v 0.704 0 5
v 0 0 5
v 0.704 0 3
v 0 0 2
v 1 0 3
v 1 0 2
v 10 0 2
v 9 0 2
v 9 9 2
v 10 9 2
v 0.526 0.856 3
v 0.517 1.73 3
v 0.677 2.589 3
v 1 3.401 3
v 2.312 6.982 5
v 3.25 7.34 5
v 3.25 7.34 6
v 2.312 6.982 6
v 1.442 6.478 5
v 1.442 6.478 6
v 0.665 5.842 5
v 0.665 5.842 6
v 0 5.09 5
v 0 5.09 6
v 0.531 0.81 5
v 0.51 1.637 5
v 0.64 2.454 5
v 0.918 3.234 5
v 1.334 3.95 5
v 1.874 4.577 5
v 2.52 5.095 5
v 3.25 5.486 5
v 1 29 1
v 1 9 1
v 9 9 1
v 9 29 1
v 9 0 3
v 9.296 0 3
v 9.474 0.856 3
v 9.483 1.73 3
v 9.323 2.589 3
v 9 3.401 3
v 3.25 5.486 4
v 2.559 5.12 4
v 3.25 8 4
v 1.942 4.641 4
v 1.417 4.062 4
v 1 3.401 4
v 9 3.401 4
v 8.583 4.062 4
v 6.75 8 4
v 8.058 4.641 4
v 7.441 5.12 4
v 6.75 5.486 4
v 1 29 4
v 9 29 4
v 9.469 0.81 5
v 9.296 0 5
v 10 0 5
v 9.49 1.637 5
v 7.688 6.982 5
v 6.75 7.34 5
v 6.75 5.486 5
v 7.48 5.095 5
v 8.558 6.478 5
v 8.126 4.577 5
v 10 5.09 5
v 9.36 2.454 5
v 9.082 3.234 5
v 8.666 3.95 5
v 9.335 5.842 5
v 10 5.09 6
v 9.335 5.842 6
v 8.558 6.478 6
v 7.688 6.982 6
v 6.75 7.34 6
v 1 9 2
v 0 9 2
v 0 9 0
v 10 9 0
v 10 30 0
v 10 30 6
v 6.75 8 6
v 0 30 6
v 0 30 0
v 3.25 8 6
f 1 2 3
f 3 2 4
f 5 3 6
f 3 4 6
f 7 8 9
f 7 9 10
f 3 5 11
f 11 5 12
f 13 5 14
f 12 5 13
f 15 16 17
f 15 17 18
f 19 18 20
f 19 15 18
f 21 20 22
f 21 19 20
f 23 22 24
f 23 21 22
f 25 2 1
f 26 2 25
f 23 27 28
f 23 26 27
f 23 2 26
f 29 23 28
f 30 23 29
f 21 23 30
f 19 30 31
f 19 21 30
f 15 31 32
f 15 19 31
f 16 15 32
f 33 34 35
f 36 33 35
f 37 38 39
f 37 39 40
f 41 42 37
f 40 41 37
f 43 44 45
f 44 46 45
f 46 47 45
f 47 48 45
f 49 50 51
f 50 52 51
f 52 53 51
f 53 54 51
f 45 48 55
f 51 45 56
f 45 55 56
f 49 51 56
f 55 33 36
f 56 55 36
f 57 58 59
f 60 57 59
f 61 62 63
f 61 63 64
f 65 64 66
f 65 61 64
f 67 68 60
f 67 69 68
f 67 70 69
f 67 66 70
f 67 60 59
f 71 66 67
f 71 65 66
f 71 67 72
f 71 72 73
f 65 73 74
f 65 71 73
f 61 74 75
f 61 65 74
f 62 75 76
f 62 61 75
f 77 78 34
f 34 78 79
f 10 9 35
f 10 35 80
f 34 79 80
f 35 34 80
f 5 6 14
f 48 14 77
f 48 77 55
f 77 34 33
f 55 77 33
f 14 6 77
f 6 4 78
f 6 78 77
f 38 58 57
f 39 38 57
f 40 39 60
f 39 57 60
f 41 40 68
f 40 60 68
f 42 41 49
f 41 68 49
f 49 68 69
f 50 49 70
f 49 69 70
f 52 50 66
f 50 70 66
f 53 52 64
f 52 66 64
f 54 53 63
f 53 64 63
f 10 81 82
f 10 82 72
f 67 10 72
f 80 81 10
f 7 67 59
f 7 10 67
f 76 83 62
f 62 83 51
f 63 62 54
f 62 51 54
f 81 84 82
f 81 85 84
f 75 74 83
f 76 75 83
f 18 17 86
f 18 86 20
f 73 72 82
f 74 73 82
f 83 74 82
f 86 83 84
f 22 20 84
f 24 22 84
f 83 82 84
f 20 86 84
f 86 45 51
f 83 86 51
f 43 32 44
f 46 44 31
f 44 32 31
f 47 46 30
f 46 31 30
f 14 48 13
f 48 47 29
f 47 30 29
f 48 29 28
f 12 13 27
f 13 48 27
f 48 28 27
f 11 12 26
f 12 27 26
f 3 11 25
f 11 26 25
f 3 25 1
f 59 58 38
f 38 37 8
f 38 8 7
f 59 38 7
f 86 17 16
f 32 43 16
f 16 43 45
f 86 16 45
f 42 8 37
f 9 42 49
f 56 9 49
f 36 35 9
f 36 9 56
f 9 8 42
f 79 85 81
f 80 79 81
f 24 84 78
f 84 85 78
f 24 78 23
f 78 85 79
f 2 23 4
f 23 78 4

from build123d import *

# Parameters (mm, degrees)
SKETCH_W        = 10
SKETCH_H        = 30
PAD_DEPTH       = 5
THICKNESS_T     = -1
POCKET_DEPTH    = 2
SKETCH002_W     = 10
SKETCH002_H     = 9
POCKET001_DEPTH = 2
PAD001_DEPTH    = 1


with BuildPart() as part:
    # Sketch → Pad (new body)
    with BuildSketch(Plane.XY):
        with Locations((5, 15)):
            Rectangle(SKETCH_W, SKETCH_H)
    extrude(amount=PAD_DEPTH)

    # Thickness
    thickness_openings = [part.faces().sort_by_distance(p)[0] for p in [
        (5, 0, 2.5),
    ]]
    offset(amount=THICKNESS_T, openings=thickness_openings)

    # Sketch001 (on Face5 of Thickness) → Pocket (cut)
    with BuildSketch(Plane.XY.offset(5)):
        with BuildLine():
            Line((3.25, 5.485527), (3.25, 8))
            Line((3.25, 8), (6.75, 8))
            Line((6.75, 8), (6.75, 5.485527))
            ThreePointArc((9.295938, 0), (9.0818, 3.234187), (6.75, 5.485527))
            Line((0.704062, 0), (9.295938, 0))
            ThreePointArc((3.25, 5.485527), (0.9182, 3.234187), (0.704062, 0))
        make_face()
    extrude(amount=-POCKET_DEPTH, mode=Mode.SUBTRACT)

    # Sketch002 (on Face4 of Pocket) → Pocket001 (cut)
    with BuildSketch(Plane(origin=(0, 0, 0), x_dir=(1, 0, 0), z_dir=(0, 0, -1))):
        with Locations((5, -4.5)):
            Rectangle(SKETCH002_W, SKETCH002_H)
    extrude(amount=-POCKET001_DEPTH, mode=Mode.SUBTRACT)

    # Sketch003 (on Face6 of Pocket001) → Pad001 (join)
    with BuildSketch(Plane.XY.offset(5)):
        with BuildLine():
            Line((0, 30), (10, 30))
            Line((10, 30), (10, 5.089746))
            ThreePointArc((10, 5.089746), (8.557562, 6.478447), (6.75, 7.339746))
            Line((6.75, 8), (6.75, 7.339746))
            Line((3.25, 8), (6.75, 8))
            Line((3.25, 7.339746), (3.25, 8))
            ThreePointArc((3.25, 7.339746), (1.442438, 6.478447), (0, 5.089746))
            Line((0, 30), (0, 5.089746))
        make_face()
    extrude(amount=PAD001_DEPTH)


solid = part.part
